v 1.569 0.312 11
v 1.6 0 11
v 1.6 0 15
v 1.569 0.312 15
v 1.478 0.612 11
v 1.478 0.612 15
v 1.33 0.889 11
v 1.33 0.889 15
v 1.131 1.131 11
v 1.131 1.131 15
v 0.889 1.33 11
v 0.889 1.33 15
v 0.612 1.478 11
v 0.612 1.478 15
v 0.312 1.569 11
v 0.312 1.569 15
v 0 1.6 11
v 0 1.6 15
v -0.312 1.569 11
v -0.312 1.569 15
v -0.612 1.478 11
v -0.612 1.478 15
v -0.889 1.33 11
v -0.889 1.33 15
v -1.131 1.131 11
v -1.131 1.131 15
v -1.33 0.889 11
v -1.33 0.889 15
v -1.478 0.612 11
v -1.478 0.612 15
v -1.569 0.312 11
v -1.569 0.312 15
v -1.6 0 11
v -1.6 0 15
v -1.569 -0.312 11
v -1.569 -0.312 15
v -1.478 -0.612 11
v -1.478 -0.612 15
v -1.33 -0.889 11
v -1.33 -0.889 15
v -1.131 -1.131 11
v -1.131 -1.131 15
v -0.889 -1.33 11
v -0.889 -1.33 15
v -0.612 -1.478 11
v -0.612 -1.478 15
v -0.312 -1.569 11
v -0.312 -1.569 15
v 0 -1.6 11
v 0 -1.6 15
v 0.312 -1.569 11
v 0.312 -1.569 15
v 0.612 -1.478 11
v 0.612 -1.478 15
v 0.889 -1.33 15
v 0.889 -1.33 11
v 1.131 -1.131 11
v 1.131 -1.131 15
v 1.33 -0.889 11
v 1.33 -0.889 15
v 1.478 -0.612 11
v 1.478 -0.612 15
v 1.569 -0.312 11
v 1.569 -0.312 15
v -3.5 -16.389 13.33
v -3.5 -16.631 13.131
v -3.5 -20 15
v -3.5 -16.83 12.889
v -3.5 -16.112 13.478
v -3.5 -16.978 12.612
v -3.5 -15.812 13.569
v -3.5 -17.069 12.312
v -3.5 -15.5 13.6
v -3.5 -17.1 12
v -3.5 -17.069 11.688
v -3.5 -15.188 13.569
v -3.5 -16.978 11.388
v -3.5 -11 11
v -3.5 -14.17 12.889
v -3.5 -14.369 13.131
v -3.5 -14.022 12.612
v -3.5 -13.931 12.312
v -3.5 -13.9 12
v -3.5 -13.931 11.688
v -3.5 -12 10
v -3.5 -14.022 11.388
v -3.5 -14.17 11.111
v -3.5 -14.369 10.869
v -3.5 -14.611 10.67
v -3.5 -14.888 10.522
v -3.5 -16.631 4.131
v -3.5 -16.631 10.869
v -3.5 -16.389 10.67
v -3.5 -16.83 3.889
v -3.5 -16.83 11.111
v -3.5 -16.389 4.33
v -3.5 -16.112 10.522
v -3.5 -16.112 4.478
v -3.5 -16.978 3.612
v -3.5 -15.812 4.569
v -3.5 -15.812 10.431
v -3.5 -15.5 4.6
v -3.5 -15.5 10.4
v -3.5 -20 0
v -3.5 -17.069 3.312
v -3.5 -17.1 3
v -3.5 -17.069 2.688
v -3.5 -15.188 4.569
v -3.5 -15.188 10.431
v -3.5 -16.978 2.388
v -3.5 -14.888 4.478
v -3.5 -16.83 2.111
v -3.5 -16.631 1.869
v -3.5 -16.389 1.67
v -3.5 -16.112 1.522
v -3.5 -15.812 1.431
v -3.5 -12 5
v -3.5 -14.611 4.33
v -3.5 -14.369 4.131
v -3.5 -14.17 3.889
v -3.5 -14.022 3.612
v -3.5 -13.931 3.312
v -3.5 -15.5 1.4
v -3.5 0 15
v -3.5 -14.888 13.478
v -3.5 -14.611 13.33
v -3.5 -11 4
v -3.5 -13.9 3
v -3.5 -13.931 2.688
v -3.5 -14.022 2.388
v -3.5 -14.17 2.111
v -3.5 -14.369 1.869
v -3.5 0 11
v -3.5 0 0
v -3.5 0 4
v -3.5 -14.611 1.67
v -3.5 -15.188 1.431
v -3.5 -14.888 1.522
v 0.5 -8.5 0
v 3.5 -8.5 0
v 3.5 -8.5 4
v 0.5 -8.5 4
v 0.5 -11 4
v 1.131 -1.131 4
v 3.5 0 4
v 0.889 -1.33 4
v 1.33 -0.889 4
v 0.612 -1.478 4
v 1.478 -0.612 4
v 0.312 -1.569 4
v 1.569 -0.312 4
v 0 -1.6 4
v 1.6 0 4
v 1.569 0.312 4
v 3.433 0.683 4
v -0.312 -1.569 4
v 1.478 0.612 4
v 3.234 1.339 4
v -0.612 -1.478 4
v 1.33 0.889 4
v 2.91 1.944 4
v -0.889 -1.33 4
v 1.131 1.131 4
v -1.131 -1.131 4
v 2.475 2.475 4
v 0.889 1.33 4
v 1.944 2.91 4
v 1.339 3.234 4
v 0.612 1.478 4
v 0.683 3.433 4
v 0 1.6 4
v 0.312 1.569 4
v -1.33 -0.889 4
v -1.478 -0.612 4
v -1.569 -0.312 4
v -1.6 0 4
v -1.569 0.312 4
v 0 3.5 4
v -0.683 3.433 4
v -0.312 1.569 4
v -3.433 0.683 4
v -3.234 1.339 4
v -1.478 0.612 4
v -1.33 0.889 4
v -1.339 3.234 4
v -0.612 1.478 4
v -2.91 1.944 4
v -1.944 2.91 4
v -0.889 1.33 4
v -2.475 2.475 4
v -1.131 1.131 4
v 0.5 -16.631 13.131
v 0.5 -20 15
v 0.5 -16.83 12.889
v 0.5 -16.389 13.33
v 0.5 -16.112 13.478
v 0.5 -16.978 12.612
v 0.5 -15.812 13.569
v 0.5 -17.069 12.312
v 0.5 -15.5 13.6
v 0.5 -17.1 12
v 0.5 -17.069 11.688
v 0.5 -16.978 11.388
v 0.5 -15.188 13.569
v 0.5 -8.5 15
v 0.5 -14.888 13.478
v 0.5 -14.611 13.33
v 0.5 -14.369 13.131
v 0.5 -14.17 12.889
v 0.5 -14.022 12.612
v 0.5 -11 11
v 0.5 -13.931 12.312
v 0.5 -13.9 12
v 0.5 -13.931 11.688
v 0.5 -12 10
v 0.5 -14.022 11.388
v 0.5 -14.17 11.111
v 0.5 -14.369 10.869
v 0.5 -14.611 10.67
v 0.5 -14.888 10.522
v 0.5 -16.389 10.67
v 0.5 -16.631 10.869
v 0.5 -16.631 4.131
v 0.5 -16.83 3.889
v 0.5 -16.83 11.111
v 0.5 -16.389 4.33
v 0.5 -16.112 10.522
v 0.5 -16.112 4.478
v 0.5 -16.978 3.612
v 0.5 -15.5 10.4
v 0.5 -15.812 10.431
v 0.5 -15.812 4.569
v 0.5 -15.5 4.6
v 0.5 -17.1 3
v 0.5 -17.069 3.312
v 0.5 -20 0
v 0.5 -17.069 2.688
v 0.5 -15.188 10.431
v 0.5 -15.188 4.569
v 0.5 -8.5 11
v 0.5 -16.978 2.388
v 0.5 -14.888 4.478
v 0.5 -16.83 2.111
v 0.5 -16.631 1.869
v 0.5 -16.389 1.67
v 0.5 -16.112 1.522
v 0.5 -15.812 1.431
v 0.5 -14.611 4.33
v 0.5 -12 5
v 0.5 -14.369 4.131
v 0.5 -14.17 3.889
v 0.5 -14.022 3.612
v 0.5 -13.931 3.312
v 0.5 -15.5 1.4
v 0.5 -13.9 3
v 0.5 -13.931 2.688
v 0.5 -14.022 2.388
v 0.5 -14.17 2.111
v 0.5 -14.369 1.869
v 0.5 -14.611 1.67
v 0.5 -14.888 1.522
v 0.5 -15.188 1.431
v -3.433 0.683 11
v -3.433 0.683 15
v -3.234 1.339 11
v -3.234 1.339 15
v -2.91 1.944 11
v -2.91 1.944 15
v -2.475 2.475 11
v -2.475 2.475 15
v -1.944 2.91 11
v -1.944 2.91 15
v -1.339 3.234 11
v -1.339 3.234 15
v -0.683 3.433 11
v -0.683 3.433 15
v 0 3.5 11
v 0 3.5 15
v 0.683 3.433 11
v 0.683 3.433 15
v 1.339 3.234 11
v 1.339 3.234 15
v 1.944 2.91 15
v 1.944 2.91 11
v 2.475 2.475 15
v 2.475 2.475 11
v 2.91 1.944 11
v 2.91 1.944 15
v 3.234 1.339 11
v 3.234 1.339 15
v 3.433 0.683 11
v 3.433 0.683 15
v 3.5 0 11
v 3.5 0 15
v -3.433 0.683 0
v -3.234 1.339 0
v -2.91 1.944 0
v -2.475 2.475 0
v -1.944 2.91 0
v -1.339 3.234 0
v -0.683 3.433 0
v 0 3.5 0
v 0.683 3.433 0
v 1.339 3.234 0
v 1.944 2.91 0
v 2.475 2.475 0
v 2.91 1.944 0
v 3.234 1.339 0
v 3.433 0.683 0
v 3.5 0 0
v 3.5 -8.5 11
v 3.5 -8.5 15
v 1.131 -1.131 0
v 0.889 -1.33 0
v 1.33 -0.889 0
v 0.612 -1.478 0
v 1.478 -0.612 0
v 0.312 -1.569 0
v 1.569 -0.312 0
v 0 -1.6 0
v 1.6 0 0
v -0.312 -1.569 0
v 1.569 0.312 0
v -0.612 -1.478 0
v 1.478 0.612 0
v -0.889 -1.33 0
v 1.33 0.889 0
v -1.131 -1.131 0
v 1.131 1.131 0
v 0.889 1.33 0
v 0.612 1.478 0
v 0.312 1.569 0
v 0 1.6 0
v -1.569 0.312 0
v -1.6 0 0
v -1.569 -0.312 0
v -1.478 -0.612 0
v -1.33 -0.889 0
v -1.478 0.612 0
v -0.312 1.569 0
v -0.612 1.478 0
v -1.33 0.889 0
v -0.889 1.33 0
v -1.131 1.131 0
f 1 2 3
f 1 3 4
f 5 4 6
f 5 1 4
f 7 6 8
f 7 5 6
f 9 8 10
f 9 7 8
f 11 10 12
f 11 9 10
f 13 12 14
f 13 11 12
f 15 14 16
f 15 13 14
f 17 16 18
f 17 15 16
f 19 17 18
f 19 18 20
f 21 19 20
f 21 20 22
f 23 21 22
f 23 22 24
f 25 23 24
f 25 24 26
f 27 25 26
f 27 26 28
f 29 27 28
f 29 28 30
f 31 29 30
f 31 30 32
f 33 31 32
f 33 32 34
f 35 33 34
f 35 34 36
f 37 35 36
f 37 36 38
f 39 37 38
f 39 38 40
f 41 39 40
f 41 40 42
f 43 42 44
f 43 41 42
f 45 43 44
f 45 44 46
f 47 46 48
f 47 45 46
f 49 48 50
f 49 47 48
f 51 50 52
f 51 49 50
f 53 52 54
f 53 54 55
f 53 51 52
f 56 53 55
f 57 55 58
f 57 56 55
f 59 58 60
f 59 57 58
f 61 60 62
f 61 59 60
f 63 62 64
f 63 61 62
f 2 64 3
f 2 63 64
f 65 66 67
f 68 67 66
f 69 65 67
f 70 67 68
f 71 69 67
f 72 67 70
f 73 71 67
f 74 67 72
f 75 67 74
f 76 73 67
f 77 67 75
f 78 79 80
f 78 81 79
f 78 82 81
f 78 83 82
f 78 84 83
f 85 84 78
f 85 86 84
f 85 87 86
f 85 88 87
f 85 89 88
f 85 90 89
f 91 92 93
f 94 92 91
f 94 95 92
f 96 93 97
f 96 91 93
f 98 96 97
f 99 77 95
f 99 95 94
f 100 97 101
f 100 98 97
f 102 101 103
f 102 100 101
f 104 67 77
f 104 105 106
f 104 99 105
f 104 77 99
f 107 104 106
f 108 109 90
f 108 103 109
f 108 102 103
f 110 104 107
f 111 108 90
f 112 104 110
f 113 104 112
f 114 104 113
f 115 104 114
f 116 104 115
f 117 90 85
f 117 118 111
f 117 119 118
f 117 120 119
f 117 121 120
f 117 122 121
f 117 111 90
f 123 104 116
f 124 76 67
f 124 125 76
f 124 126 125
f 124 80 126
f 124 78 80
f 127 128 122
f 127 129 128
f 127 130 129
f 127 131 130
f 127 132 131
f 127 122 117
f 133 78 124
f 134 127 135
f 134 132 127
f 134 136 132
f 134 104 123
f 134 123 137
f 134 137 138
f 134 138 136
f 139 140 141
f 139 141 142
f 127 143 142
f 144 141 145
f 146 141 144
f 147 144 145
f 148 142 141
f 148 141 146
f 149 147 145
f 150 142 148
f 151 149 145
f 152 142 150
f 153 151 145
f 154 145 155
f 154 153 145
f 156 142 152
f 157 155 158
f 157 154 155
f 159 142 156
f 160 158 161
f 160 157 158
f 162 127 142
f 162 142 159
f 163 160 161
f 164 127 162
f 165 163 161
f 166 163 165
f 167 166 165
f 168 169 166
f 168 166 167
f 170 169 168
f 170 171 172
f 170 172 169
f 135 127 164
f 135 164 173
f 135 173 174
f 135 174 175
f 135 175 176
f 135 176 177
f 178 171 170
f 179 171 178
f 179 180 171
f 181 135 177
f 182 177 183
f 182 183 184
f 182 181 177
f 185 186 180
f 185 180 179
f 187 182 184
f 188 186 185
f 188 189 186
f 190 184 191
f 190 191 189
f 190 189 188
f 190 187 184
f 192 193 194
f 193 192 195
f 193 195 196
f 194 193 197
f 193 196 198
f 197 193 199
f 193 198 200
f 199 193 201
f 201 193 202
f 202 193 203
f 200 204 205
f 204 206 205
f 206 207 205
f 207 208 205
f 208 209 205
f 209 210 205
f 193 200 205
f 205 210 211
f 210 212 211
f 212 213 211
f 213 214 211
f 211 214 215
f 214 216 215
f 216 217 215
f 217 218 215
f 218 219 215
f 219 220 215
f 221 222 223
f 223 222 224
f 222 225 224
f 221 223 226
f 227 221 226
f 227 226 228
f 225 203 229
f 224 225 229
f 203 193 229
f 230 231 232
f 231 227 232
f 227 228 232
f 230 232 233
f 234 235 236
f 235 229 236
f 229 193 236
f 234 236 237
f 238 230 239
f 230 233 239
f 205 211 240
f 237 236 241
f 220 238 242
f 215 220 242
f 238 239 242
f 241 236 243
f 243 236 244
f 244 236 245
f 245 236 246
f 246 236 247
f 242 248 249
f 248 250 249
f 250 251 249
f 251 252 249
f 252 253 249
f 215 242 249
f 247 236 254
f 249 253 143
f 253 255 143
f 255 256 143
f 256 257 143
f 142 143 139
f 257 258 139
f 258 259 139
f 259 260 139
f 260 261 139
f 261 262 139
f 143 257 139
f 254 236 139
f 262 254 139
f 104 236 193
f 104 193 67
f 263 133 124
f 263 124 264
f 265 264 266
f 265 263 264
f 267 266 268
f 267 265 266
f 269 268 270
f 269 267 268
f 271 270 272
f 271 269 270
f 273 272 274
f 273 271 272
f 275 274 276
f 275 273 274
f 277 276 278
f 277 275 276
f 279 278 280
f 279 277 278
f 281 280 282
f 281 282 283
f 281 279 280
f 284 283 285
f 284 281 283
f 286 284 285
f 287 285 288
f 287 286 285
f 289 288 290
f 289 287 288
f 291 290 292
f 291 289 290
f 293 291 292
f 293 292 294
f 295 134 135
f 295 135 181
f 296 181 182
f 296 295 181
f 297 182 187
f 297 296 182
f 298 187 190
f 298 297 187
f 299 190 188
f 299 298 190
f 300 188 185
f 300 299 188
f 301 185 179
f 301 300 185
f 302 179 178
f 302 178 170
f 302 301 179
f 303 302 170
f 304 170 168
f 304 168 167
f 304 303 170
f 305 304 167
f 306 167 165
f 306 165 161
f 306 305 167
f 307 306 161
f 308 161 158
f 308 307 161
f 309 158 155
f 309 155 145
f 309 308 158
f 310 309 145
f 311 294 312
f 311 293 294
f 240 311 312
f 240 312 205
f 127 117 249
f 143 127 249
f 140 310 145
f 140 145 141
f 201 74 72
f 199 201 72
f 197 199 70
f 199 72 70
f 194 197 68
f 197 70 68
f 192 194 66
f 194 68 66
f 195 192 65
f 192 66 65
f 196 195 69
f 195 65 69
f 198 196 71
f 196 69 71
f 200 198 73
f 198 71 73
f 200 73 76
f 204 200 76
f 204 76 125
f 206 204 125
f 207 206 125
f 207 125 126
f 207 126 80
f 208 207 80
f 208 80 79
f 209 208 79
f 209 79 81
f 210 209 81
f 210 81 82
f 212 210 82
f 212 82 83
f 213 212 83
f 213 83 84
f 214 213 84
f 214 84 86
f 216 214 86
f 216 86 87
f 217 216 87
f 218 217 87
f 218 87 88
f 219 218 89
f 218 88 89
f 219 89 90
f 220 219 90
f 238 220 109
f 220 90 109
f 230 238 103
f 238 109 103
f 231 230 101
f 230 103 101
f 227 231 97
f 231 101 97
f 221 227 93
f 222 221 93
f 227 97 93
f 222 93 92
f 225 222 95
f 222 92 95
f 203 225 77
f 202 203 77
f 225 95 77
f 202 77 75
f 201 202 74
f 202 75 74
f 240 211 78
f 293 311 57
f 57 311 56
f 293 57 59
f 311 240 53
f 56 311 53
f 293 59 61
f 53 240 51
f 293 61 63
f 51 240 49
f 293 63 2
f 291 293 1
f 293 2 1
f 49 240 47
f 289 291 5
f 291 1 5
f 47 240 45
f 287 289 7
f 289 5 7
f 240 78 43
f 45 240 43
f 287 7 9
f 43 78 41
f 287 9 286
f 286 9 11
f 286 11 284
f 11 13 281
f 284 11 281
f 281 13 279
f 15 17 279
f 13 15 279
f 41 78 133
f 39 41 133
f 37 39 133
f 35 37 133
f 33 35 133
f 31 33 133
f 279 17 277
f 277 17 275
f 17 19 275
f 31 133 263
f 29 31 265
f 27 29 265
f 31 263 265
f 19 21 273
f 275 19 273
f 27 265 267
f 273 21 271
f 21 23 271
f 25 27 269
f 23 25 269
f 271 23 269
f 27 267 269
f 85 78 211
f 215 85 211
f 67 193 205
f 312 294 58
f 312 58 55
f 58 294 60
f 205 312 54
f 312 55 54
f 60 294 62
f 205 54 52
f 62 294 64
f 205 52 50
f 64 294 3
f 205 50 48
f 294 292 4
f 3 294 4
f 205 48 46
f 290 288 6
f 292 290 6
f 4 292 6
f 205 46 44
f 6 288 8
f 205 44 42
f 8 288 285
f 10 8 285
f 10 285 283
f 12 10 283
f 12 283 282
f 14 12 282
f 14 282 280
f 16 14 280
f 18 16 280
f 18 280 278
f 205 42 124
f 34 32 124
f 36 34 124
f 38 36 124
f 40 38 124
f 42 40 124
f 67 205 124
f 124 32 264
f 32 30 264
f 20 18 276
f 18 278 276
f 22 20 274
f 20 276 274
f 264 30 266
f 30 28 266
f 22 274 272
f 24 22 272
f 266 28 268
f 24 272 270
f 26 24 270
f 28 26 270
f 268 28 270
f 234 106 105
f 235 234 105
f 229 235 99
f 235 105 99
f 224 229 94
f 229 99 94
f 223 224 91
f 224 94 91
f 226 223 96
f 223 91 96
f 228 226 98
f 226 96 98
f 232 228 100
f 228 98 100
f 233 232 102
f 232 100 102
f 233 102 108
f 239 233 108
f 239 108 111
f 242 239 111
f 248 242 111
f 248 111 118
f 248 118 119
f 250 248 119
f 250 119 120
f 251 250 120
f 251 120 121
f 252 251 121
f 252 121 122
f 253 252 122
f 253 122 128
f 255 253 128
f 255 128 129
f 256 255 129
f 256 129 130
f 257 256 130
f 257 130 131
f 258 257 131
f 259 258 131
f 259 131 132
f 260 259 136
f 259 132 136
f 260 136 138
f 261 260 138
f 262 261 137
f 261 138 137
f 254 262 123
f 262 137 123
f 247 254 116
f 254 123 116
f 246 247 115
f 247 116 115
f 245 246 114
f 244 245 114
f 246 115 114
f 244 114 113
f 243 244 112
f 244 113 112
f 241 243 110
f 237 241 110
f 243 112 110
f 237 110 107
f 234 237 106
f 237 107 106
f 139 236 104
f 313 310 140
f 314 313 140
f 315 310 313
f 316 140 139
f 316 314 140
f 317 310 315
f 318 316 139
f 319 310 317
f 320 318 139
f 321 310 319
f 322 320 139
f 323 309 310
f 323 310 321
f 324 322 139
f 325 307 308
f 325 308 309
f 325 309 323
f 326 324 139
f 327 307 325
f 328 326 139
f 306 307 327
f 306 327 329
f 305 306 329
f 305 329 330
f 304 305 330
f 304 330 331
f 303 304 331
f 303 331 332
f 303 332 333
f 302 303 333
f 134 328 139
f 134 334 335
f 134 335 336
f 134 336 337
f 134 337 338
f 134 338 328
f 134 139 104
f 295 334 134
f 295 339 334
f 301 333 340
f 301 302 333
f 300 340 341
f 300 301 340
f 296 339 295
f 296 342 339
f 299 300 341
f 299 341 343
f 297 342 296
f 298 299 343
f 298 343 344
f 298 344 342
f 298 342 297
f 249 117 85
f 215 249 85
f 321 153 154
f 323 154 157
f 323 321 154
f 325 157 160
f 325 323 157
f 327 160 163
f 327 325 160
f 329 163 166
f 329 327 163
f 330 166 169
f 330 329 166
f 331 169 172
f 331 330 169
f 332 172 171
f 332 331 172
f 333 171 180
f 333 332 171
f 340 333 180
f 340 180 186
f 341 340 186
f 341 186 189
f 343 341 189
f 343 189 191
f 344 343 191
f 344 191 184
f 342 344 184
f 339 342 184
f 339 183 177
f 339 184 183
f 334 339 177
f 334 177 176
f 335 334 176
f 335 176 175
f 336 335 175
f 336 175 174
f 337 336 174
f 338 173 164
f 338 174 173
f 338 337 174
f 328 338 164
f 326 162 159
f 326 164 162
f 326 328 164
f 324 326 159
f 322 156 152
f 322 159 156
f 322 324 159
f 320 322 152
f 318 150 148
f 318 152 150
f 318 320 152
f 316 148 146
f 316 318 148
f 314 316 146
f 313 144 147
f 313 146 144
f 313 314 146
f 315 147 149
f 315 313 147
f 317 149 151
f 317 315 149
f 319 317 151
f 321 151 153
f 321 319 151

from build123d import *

# Parameters (mm, degrees)
SKETCH_1_R          = 1.6
EXTRUDE_1_DEPTH     = 15
SKETCH_3_W          = 7
SKETCH_3_H          = 18.899287815
CUT_EXTRUDE_2_DEPTH = 26.961509971
SKETCH_4_W          = 3
SKETCH_4_H          = 17
CUT_EXTRUDE_3_DEPTH = 26.243811123
SKETCH_5_R          = 1.6
CUT_EXTRUDE_4_DEPTH = 10
CHAMFER_1_SIZE      = 1


with BuildPart() as part:
    # 草图1 → 凸台-拉伸1 (new body)
    with BuildSketch(Plane.XY):
        with BuildLine():
            Line((-3.5, -20), (-3.5, 0))
            ThreePointArc((-3.5, 0), (0, 3.5), (3.5, 0))
            Line((3.5, 0), (3.5, -20))
            Line((3.5, -20), (-3.5, -20))
        make_face()
        Circle(SKETCH_1_R, mode=Mode.SUBTRACT)
    extrude(amount=EXTRUDE_1_DEPTH)

    # 草图3 → 切除-拉伸2 (cut, through all)
    with BuildSketch(Plane.ZY.offset(3.5)):
        with Locations((7.5, -2.550356092)):
            Rectangle(SKETCH_3_W, SKETCH_3_H)
    extrude(amount=-CUT_EXTRUDE_2_DEPTH, mode=Mode.SUBTRACT)

    # 草图4 → 切除-拉伸3 (cut, through all)
    with BuildSketch(Plane(origin=(0, 0, 0), x_dir=(-1, 0, 0), z_dir=(0, 0, -1))):
        with Locations((-2, -17)):
            Rectangle(SKETCH_4_W, SKETCH_4_H)
    extrude(amount=-CUT_EXTRUDE_3_DEPTH, mode=Mode.SUBTRACT)

    # 草图5 → 切除-拉伸4 (cut)
    with BuildSketch(Plane.ZY.offset(3.5)):
        with Locations(Location((12, -15.5, 0), (0, 0, 270))):
            Circle(SKETCH_5_R)
        with Locations(Location((3, -15.5, 0), (0, 0, 270))):
            Circle(SKETCH_5_R)
    extrude(amount=-CUT_EXTRUDE_4_DEPTH, mode=Mode.SUBTRACT)

    # 倒角1
    chamfer_1_edges = [part.edges().sort_by_distance(p)[0] for p in [
        (-1.5, -12, 11),
        (-1.5, -12, 4),
    ]]
    chamfer(chamfer_1_edges, length=CHAMFER_1_SIZE)


solid = part.part
